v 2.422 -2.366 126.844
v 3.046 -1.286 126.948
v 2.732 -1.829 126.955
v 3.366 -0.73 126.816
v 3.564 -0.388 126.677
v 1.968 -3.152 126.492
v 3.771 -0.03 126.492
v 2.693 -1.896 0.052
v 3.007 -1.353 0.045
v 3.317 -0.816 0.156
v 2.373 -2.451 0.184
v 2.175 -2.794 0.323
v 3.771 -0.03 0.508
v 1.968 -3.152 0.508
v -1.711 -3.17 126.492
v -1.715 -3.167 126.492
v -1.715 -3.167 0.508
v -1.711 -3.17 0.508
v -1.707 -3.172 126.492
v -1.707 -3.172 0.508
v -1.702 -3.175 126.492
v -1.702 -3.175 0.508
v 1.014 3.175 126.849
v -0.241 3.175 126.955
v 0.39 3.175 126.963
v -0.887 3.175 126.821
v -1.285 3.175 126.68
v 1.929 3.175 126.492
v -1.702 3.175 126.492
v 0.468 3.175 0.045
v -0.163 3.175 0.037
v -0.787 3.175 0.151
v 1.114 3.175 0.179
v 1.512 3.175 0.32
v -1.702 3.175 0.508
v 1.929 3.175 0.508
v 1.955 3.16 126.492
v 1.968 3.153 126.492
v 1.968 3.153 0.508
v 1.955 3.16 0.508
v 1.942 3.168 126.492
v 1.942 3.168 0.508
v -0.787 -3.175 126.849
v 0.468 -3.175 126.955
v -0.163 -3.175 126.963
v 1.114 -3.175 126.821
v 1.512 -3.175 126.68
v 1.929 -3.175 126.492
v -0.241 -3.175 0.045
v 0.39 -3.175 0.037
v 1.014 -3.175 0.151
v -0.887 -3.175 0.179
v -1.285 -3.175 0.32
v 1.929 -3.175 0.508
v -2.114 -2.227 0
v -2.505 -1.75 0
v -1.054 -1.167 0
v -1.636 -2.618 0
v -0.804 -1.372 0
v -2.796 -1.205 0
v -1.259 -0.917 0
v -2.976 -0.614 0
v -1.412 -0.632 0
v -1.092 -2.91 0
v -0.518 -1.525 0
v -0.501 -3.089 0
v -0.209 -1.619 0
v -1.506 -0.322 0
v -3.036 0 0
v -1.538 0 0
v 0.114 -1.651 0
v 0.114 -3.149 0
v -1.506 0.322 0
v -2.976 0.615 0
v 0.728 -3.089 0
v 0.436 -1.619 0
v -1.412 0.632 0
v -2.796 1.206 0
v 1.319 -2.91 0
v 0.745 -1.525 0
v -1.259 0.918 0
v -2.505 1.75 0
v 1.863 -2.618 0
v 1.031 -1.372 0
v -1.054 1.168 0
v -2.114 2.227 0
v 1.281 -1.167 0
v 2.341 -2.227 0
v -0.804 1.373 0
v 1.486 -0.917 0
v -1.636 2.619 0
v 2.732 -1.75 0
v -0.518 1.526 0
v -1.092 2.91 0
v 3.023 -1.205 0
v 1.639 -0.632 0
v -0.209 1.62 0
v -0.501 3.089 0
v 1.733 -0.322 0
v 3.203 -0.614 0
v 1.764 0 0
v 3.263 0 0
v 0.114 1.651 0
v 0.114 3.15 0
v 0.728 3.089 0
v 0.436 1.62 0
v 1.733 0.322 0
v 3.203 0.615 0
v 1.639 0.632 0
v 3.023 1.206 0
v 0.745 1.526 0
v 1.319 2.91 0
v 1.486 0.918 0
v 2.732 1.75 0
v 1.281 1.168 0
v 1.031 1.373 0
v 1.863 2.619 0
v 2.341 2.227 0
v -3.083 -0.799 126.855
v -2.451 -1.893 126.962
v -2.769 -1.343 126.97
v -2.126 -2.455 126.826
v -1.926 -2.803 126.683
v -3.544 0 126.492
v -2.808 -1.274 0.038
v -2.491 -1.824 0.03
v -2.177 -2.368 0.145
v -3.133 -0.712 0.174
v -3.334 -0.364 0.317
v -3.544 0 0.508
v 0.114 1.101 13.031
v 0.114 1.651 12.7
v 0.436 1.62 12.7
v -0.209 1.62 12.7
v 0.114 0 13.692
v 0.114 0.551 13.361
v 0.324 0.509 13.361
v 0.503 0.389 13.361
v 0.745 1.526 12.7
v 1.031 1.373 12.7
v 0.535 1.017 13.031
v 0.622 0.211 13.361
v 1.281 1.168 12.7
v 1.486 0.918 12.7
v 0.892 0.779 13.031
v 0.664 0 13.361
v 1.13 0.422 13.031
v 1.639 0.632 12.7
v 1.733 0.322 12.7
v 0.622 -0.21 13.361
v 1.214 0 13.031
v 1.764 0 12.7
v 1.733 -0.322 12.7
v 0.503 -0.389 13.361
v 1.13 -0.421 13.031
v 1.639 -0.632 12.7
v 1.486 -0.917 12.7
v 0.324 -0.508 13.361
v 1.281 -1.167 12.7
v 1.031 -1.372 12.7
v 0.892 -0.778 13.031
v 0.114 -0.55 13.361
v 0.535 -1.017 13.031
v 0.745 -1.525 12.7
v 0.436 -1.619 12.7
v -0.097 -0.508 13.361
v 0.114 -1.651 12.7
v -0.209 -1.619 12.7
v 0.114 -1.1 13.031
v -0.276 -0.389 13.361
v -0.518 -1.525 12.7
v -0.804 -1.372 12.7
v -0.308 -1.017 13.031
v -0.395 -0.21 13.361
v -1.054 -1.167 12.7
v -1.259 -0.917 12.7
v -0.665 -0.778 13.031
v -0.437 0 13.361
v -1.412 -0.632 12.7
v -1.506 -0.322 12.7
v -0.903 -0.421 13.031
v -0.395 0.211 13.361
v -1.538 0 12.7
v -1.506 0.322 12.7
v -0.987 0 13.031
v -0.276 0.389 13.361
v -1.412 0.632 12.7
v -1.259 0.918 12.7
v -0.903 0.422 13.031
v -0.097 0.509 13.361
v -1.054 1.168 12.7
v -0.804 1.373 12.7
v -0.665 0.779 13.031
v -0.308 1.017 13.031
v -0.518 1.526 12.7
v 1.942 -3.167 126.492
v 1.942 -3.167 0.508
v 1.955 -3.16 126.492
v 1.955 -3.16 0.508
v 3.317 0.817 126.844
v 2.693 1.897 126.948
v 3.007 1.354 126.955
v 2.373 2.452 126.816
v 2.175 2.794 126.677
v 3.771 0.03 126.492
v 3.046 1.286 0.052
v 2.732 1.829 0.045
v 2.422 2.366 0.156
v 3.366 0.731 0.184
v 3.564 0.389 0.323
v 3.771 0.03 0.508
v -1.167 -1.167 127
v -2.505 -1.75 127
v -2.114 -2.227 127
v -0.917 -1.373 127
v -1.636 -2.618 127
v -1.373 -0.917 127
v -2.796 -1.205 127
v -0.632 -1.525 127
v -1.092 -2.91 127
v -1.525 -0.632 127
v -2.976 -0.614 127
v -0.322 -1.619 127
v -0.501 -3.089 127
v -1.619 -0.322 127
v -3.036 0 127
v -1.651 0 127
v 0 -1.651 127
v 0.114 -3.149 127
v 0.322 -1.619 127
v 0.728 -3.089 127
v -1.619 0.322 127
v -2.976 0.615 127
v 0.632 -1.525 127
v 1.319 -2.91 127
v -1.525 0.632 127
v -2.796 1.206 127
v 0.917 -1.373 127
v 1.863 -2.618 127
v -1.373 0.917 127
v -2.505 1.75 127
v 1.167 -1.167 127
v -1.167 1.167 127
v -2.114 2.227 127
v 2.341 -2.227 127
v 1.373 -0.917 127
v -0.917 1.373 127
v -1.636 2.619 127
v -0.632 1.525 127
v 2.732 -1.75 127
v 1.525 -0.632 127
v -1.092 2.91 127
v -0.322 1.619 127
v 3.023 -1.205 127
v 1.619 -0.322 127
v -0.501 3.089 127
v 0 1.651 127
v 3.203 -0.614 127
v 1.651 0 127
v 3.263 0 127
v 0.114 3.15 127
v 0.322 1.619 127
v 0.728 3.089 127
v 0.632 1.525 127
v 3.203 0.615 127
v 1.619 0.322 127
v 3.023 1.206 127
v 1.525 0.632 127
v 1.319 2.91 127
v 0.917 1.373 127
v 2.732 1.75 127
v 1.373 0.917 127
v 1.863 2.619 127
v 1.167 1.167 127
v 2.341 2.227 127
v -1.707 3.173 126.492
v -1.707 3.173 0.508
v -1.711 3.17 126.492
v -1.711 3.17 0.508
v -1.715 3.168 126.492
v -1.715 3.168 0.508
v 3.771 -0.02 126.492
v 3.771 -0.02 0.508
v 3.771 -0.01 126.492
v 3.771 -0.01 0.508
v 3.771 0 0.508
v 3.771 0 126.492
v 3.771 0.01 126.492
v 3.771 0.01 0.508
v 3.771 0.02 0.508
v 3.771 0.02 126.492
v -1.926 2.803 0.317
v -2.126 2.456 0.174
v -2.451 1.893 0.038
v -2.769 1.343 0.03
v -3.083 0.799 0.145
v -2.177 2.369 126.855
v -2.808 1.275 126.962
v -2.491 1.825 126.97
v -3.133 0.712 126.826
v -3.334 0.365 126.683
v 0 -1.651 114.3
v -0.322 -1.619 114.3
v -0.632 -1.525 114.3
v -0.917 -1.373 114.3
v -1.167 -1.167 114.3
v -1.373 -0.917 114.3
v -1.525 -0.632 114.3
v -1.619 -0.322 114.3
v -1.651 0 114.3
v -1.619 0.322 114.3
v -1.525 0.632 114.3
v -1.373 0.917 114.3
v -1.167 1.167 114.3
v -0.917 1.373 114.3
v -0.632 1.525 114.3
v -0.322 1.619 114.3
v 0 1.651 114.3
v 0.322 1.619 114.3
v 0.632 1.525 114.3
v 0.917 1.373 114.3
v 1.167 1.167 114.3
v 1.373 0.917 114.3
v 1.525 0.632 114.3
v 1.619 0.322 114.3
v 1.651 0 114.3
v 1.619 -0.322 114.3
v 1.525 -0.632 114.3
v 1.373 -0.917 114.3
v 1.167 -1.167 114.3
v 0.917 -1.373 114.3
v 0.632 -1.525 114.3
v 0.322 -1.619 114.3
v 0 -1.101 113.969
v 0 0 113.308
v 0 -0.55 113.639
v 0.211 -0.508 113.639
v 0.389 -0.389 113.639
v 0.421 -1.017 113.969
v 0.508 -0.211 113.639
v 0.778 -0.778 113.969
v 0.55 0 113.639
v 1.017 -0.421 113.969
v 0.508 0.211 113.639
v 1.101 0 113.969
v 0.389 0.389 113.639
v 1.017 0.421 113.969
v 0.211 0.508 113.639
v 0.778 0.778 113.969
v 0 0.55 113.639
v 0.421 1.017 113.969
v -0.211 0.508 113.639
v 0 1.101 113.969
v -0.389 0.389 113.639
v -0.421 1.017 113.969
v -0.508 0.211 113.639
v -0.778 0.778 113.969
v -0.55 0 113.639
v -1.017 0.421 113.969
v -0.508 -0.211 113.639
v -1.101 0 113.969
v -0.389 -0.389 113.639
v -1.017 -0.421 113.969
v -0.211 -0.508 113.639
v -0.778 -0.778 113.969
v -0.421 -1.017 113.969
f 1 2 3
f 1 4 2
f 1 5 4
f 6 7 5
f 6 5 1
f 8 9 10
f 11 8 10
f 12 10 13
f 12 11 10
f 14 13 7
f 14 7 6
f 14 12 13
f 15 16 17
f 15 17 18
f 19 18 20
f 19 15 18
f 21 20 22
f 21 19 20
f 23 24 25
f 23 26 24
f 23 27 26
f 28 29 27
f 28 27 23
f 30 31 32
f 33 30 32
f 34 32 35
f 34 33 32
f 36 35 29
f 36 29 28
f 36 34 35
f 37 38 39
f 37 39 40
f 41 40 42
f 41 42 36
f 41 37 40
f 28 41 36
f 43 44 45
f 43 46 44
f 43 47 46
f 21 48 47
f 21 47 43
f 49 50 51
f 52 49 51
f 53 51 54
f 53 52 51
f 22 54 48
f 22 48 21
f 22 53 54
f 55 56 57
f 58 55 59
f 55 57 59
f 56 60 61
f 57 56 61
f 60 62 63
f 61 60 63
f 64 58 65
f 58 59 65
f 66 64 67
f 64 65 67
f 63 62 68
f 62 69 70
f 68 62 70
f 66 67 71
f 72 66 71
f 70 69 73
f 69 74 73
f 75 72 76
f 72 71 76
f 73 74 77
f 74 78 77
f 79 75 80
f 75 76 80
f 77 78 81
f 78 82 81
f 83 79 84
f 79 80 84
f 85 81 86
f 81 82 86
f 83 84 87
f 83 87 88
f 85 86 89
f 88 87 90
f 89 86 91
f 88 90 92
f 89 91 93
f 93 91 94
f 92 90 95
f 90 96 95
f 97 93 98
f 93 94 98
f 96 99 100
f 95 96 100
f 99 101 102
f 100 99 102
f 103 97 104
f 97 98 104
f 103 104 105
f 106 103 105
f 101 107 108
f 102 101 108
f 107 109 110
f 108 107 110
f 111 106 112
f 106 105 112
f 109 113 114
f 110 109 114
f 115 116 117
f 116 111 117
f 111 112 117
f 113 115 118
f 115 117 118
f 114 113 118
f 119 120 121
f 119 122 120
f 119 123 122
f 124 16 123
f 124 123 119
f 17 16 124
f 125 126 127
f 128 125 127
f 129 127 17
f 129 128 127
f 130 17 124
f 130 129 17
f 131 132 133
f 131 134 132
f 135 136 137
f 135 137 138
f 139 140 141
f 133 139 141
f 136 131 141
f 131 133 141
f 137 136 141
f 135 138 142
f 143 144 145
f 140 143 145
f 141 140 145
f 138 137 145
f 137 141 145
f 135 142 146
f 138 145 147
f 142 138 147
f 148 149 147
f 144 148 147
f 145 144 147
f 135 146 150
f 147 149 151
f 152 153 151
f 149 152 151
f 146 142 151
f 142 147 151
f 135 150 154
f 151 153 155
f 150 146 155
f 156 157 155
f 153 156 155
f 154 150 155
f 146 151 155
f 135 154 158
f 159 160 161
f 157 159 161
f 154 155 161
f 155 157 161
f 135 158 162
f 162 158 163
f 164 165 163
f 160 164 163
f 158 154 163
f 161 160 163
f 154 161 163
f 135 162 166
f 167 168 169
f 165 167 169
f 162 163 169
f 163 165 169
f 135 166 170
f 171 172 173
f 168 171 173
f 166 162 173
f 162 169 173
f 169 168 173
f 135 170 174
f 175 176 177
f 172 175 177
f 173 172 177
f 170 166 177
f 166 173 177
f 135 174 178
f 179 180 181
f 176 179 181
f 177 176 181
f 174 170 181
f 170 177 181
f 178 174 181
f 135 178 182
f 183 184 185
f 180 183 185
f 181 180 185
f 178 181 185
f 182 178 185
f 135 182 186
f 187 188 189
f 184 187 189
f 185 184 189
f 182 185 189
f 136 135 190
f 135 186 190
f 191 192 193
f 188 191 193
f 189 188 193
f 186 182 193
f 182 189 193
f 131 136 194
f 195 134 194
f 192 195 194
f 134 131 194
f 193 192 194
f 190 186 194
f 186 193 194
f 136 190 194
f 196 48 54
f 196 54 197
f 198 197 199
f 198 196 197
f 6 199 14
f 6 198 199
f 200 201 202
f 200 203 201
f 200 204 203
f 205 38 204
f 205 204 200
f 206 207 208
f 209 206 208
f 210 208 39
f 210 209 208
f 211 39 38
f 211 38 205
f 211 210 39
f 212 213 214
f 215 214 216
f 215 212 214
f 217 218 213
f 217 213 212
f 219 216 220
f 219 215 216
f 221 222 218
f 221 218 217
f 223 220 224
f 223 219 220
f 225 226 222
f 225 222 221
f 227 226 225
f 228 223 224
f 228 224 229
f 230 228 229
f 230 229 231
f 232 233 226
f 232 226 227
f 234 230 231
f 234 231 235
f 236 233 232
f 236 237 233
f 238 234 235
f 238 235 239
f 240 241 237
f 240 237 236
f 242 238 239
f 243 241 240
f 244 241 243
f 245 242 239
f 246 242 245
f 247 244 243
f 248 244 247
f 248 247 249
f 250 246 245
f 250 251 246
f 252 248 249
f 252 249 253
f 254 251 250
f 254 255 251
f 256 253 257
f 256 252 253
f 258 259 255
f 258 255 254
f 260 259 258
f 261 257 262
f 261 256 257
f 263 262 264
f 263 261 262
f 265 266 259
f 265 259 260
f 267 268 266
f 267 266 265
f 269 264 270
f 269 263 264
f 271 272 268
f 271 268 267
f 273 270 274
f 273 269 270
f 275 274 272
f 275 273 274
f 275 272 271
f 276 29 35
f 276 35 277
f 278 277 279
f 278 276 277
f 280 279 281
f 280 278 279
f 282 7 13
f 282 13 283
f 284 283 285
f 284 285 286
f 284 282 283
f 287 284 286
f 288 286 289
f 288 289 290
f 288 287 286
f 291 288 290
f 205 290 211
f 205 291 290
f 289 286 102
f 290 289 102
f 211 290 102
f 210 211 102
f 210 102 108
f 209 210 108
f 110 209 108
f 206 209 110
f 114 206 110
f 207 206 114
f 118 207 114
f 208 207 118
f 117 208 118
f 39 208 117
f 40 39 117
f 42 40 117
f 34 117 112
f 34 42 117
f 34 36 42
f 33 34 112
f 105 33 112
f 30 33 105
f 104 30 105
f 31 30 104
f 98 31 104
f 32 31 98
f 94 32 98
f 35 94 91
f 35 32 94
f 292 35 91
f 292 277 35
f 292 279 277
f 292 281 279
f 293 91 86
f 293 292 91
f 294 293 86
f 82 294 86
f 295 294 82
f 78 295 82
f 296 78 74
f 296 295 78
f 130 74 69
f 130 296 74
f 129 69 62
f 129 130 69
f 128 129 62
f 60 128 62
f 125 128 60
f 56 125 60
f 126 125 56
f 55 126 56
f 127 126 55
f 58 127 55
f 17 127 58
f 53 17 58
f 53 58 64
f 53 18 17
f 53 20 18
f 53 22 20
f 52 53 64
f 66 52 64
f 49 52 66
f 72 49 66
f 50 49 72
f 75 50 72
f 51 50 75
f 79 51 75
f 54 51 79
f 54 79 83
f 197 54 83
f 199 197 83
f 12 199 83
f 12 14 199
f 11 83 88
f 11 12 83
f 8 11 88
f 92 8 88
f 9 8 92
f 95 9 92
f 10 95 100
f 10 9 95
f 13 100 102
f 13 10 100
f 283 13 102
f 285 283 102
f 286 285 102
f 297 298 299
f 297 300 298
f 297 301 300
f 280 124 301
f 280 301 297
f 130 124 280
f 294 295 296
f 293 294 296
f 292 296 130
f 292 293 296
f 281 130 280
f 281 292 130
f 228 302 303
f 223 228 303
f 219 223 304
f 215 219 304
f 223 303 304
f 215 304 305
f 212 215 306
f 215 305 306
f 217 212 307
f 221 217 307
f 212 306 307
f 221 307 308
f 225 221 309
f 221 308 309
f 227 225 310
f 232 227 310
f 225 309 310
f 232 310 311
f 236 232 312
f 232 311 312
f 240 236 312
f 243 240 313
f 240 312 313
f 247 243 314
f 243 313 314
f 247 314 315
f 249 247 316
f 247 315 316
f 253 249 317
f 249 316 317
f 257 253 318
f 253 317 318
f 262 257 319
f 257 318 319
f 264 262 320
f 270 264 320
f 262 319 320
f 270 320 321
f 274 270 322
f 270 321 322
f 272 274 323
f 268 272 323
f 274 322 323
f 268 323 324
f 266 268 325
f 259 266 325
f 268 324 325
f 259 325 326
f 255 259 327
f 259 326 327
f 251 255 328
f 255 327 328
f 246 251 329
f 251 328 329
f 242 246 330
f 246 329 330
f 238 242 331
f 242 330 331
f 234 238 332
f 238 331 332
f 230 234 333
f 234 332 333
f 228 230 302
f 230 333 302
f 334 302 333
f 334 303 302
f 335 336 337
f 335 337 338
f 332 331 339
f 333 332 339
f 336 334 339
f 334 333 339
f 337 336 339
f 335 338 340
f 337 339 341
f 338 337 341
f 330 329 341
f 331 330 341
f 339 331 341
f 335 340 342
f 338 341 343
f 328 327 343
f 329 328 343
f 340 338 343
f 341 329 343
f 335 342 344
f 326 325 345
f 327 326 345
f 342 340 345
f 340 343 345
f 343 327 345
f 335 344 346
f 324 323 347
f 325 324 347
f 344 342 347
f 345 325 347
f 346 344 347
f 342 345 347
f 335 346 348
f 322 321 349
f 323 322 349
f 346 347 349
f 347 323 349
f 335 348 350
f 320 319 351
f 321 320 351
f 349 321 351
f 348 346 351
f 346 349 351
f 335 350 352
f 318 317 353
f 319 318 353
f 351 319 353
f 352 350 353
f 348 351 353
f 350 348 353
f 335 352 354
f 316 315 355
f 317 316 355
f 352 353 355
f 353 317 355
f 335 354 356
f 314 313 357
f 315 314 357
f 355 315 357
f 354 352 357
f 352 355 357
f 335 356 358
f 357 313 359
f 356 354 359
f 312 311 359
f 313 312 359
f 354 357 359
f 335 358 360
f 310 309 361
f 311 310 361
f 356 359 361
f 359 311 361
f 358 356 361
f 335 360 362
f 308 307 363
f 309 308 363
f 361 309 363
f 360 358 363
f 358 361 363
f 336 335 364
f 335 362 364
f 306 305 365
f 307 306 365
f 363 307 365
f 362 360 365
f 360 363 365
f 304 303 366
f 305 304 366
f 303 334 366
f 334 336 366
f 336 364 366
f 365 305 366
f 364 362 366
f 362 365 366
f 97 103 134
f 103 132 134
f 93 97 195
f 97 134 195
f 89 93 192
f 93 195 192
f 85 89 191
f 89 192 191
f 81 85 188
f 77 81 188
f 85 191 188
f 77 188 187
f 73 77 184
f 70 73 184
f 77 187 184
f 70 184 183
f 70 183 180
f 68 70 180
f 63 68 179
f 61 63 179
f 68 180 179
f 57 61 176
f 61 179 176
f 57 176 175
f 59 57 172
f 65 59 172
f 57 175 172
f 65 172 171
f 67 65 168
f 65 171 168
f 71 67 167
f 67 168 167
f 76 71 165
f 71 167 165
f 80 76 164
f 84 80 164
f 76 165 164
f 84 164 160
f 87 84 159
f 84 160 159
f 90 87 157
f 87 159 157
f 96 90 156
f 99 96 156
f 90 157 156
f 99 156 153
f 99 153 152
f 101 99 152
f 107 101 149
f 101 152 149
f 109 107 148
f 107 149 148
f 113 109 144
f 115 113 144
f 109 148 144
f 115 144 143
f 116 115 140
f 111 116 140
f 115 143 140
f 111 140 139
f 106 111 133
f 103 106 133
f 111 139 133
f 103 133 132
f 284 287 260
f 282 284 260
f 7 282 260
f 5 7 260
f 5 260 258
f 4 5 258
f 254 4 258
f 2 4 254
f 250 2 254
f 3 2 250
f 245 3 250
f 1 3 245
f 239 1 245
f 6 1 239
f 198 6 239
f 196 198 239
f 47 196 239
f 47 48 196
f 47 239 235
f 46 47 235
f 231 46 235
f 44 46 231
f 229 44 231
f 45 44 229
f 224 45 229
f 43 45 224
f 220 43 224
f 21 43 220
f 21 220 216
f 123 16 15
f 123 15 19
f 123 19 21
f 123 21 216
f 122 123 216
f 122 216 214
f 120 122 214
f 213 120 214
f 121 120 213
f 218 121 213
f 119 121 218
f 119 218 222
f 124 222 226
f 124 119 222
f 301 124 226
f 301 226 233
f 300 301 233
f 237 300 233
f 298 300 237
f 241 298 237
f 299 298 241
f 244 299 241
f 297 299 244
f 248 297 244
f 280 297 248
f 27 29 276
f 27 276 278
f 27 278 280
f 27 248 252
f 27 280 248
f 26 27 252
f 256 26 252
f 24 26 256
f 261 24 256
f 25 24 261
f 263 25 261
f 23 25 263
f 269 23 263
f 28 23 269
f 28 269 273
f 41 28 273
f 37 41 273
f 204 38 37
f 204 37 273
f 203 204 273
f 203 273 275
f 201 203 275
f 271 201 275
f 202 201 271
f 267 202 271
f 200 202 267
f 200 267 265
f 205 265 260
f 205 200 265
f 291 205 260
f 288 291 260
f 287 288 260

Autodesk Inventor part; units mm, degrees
ref_plane "YZ Plane" through (0, 0, 0) normal (1, 0, 0) x (0, 1, 0)
sketch "Sketch1" plane through (0, 0, 0) normal (0, 0, 1) x (1, 0, 0)
  line L0 (1.9552, -3.1747) -> (-1.711, -3.1747)
  line L1 (-1.711, -3.1747) -> (-3.5441, 0.0003)
  line L2 (-3.5441, 0.0003) -> (-1.711, 3.1753)
  line L3 (-1.711, 3.1753) -> (1.9552, 3.1753)
  line L4 (1.9552, 3.1753) -> (3.7883, 0.0003)
  line L5 (3.7883, 0.0003) -> (1.9552, -3.1747)
  point P0 (0.1221, 0.0003)
  dimension "d0" = 6.35
extrude "Extrusion1" add sketch "Sketch1" along normal blind 127
ref_plane "Work Plane1" through (-1.711, 0.0003, 0) normal (0, 1, 0) x (1, 0, 0)
sketch "Sketch3" plane through (-1.711, 0.0003, 0) normal (0, 1, 0) x (1, 0, 0)
  line L0 (-1.3251, 0) -> (4.9741, 0)
  line L1 (5.4821, -0.508) -> (5.4821, -126.492)
  line L2 (-1.8331, -126.492) -> (-1.8331, -0.508)
  line L3 (-1.8331, -0.508) -> (-1.3251, 0)
  line L4 (4.9741, 0) -> (5.4821, -0.508)
  line L5 (-1.8331, 0) -> (-1.8331, -127) projected
  line L6 (3.6662, 0) -> (5.4993, 0) projected
  line L7 (1.8245, 0) -> (1.8245, -127)
  line L8 (0, -127) -> (-1.8331, -127) projected
  line L9 (5.4993, -127) -> (3.6662, -127) projected
  line L10 (3.6662, -127) -> (0, -127) projected
  line L11 (-1.3251, -127) -> (-1.8331, -126.492)
  line L12 (4.9741, -127) -> (5.4821, -126.492)
  point P0 (-1.8331, 0)
  point P1 (5.4821, 0)
  point P2 (5.4821, -127)
  dimension "d5" = 0.508
  dimension "d6" = 0.508
  dimension "d7" = 0.508
  dimension "d8" = 0.508
  dimension "d16" = 0
  dimension "d46" = 0.508
  dimension "d47" = 0.508
  dimension "d48" = 0.508
  dimension "d49" = 0.508
revolve "Revolution1" cut sketch "Sketch3" angle 360 about axis through (0.1135, 0.0003, 0) along (0, 0, 1) keep common part contours L0 L4 L1 L12 L9 L10 L7
sketch "Sketch6" plane through (0.1135, 0.0003, 0) normal (0, 0, -1) x (-1, 0, 0)
  circle A0 centre (0, 0) radius 3.1496 projected
hole "Hole3" at (0.1135, 0.0003, 0) direction (0, 0, 1) diameter 3.302 depth 12.7 tip angle 118 thread size "8-32 UNC" class "2B" standard "ANSI Unified Screw Threads"
sketch "Sketch7" plane through (0, 0, 127) normal (0, 0, 1) x (1, 0, 0)
  point P0 (0, 0)
hole "Hole4" at (0, 0, 127) direction (0, 0, -1) diameter 3.302 depth 12.7 tip angle 118 thread size "8-32 UNC" class "2B" standard "ANSI Unified Screw Threads"
ref_plane "Work Plane2" through (0.1135, 0.0003, 63.5) normal (0, 0, -1) x (-1, 0, 0)
equation "\"d6\" = d5"
equation "\"d7\" = d5"
equation "\"d8\" = d7"
properties part number "5 inch Standoff" material "Steel"
